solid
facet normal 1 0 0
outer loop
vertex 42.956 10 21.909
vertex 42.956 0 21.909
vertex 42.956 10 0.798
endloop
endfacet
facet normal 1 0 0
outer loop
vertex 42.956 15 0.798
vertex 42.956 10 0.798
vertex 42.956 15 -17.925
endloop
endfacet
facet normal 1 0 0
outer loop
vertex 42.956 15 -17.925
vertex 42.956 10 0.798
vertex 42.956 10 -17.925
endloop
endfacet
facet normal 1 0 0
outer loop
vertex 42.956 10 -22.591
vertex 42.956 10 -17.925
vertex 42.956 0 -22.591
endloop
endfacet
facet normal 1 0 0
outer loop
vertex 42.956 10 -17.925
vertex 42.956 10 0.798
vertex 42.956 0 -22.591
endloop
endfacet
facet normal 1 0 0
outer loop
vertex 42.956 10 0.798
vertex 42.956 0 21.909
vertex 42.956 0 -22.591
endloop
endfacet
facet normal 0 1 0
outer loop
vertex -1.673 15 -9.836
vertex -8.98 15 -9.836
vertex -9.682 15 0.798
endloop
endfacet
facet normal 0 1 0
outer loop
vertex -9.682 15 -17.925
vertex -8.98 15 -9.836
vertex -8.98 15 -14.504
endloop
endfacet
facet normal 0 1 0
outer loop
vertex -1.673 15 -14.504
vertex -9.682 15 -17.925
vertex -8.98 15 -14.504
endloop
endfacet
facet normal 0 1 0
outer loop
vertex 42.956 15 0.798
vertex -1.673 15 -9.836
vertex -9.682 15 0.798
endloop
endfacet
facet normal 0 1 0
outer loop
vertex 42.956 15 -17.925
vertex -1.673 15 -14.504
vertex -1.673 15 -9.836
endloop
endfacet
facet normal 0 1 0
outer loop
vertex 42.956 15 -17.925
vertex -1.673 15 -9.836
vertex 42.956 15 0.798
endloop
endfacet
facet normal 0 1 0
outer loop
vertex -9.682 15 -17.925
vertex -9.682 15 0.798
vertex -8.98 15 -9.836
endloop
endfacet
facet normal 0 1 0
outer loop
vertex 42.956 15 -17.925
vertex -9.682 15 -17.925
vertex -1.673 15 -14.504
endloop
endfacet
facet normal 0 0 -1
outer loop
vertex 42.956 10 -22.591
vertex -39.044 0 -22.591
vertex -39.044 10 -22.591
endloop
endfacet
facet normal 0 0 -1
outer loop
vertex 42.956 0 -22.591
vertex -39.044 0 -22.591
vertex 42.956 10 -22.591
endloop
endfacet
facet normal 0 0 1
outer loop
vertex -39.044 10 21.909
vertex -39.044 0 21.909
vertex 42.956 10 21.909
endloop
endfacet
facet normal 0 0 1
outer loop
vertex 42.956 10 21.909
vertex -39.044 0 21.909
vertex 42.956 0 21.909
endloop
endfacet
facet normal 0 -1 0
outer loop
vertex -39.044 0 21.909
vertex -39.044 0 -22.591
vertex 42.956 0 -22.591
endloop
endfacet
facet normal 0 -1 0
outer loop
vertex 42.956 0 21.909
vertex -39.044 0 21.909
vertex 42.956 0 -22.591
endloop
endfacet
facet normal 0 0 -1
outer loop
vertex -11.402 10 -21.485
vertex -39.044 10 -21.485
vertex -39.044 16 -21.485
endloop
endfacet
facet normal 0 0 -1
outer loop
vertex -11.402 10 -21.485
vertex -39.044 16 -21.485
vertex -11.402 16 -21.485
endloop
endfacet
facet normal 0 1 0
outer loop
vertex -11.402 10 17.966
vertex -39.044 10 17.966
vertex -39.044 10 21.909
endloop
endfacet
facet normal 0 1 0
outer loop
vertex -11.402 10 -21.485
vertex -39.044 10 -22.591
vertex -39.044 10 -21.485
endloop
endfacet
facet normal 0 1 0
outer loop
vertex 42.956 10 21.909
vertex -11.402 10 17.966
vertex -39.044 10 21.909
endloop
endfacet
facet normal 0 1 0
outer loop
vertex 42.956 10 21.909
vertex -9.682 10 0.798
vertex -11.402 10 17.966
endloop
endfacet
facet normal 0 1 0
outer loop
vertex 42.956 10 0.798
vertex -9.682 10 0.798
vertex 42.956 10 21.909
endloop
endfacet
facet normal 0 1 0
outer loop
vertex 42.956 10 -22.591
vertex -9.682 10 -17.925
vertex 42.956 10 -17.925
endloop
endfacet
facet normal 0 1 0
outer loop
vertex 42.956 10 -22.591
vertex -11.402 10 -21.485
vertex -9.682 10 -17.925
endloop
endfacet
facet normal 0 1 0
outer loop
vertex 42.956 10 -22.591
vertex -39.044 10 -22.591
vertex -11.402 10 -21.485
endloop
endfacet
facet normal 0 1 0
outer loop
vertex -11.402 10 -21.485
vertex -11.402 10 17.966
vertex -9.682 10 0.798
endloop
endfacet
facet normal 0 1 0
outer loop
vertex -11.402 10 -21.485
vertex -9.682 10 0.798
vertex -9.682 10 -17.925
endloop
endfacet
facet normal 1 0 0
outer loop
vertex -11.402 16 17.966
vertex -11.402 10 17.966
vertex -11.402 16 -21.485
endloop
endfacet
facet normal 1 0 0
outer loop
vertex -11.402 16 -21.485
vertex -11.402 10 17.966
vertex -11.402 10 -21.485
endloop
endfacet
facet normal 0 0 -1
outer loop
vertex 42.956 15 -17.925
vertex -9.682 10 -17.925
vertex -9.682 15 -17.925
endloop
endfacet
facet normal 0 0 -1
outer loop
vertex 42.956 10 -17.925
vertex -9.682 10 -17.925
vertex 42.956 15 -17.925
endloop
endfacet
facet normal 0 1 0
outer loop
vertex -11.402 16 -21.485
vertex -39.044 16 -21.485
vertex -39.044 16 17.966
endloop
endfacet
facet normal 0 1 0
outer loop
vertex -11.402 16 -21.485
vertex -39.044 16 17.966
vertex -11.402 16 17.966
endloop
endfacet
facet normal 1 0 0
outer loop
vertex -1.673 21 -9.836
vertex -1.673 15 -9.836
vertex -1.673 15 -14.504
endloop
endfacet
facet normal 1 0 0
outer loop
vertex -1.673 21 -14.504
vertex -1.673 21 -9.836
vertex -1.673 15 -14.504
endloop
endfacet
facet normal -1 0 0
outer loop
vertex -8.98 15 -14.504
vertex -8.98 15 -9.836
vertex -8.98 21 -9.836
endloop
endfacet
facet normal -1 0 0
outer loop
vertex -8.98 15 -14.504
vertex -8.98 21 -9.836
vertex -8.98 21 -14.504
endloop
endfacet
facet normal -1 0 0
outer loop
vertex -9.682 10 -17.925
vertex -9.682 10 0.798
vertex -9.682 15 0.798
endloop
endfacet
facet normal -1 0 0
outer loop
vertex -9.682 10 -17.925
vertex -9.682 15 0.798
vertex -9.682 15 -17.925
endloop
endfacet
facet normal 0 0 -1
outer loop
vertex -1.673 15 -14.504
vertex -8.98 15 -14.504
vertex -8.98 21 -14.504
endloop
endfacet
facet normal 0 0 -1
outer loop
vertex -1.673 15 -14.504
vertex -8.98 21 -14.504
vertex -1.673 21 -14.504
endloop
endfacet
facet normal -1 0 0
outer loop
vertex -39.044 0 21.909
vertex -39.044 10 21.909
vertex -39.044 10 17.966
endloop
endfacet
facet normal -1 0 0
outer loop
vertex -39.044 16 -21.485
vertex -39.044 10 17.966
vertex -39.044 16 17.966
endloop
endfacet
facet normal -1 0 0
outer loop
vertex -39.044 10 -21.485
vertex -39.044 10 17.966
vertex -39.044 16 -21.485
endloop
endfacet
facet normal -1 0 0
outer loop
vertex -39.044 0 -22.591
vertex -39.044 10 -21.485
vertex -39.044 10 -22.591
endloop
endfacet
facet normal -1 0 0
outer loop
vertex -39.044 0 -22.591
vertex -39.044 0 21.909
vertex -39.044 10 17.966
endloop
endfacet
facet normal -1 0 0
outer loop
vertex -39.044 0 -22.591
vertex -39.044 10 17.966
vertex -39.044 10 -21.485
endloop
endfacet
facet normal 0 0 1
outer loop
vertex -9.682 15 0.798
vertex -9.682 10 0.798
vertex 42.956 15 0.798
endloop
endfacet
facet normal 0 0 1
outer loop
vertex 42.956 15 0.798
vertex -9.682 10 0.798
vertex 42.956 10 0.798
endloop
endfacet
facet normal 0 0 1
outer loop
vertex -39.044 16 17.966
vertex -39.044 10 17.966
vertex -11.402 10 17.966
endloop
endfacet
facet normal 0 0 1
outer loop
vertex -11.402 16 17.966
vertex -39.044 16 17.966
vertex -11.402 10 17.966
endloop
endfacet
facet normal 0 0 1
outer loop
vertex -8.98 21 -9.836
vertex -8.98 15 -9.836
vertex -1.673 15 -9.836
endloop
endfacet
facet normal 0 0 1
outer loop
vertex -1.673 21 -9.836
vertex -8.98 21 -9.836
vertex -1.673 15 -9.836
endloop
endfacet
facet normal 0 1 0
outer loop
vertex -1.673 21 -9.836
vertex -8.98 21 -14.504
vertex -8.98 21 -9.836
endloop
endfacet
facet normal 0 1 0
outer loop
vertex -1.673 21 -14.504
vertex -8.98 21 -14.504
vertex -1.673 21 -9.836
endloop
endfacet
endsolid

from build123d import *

# Parameters (mm, degrees)
SKETCH1_W           = 82
SKETCH1_H           = 44.5
BOSS_EXTRUDE1_DEPTH = 10
SKETCH2_W           = 52.638055151
SKETCH2_H           = 18.722088721
BOSS_EXTRUDE2_DEPTH = 5
SKETCH3_W           = 27.641719578
SKETCH3_H           = 39.450206574
BOSS_EXTRUDE3_DEPTH = 6
SKETCH4_W           = 7.307754503
SKETCH4_H           = 4.667726012
BOSS_EXTRUDE4_DEPTH = 6


with BuildPart() as part:
    # Sketch1 → Boss-Extrude1 (new body)
    with BuildSketch(Plane(origin=(0, 0, 0), x_dir=(1, 0, 0), z_dir=(0, 1, 0))):
        with Locations((1.955938697, 0.340996169)):
            Rectangle(SKETCH1_W, SKETCH1_H)
    extrude(amount=BOSS_EXTRUDE1_DEPTH)

    # Sketch2 → Boss-Extrude2 (add)
    with BuildSketch(Plane(origin=(0, 10, 0), x_dir=(1, 0, 0), z_dir=(0, 1, 0))):
        with Locations((16.636911121, 8.563535134)):
            Rectangle(SKETCH2_W, SKETCH2_H)
    extrude(amount=BOSS_EXTRUDE2_DEPTH)

    # Sketch3 → Boss-Extrude3 (add)
    with BuildSketch(Plane(origin=(0, 10, 0), x_dir=(1, 0, 0), z_dir=(0, 1, 0))):
        with Locations((-25.223201514, 1.759430562)):
            Rectangle(SKETCH3_W, SKETCH3_H)
    extrude(amount=BOSS_EXTRUDE3_DEPTH)

    # Sketch4 → Boss-Extrude4 (add)
    with BuildSketch(Plane(origin=(0, 15, 0), x_dir=(1, 0, 0), z_dir=(0, 1, 0))):
        with Locations((-5.326444236, 12.169741761)):
            Rectangle(SKETCH4_W, SKETCH4_H)
    extrude(amount=BOSS_EXTRUDE4_DEPTH)


solid = part.part
